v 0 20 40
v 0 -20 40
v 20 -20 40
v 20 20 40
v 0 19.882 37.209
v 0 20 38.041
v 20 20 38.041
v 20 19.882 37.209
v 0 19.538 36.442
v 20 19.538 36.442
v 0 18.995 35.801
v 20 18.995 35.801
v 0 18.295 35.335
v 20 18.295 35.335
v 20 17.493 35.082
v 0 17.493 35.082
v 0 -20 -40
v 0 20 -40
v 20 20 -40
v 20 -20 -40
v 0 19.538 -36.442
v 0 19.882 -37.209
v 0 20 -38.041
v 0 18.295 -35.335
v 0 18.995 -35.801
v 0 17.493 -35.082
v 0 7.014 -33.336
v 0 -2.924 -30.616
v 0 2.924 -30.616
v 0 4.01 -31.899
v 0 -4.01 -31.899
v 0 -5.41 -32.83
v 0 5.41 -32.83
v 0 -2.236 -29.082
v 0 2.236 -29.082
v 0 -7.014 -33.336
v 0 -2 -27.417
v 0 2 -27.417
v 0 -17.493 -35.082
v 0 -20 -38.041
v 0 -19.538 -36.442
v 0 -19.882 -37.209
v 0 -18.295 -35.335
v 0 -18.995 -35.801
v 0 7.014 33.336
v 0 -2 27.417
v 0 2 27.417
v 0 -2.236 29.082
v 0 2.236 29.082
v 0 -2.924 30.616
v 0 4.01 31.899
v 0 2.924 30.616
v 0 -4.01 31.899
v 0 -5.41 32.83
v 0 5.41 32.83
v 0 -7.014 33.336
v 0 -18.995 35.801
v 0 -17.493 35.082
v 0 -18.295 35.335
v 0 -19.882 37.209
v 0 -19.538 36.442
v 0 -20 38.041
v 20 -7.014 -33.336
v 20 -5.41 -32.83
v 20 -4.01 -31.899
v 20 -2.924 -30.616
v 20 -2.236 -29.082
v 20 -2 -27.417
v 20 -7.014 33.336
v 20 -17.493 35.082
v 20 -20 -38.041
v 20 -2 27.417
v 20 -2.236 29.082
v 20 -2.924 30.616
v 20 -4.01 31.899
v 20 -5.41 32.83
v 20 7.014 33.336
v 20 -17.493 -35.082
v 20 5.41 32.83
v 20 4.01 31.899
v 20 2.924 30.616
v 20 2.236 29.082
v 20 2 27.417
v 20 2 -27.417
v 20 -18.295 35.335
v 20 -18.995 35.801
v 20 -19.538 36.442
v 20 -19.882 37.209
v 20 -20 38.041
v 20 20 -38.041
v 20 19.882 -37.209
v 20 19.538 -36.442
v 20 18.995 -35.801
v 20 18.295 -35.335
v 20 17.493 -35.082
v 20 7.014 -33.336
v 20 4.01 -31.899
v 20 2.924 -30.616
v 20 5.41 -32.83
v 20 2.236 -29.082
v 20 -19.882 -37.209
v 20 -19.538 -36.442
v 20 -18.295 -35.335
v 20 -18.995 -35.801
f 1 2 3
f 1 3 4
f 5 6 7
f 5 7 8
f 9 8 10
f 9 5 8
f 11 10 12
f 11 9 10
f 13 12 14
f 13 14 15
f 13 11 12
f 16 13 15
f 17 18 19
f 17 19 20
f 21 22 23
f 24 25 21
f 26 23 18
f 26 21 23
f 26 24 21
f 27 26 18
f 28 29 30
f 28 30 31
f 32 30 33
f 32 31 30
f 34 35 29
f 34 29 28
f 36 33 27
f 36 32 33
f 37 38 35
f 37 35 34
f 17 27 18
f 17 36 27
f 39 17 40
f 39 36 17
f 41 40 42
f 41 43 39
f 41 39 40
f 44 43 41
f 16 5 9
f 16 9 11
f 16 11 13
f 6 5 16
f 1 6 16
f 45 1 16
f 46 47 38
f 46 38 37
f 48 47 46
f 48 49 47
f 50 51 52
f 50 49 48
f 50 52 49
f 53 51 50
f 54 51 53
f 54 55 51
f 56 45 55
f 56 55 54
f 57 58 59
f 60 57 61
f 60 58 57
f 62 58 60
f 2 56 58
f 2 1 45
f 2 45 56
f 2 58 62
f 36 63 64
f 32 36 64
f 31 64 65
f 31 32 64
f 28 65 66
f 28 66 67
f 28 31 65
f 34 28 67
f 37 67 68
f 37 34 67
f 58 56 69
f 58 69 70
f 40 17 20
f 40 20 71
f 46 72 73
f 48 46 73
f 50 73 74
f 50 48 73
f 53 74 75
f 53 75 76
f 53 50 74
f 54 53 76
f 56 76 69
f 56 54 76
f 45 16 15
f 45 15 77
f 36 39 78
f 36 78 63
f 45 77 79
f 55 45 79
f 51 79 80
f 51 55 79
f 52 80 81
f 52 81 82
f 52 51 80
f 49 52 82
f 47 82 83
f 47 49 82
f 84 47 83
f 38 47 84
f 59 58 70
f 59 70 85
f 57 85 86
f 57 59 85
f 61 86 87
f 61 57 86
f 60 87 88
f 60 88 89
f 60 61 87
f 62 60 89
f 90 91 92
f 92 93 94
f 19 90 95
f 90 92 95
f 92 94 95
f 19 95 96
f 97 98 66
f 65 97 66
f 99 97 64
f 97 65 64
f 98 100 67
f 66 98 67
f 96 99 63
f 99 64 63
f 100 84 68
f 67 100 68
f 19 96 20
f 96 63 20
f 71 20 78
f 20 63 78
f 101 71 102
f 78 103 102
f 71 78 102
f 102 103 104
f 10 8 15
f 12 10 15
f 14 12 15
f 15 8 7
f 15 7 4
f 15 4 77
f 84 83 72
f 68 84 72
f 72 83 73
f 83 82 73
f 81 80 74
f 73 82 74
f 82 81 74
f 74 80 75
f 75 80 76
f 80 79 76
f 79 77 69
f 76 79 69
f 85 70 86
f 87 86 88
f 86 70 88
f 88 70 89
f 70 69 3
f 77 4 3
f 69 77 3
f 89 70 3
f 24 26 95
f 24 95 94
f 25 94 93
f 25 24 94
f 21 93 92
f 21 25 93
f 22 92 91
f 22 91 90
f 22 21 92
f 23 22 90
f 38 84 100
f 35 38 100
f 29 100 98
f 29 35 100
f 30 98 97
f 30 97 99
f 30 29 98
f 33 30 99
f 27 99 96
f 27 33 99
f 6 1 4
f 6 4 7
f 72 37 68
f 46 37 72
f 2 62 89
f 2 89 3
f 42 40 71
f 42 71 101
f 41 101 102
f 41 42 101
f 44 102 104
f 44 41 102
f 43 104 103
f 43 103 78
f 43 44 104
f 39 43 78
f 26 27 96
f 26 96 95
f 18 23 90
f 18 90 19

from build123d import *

# Parameters (mm, degrees)
SB_KIRI_80_X_6_1_DEPTH = 20


with BuildPart() as part:
    # Sketch1 → Sb kiriş 80 X 6(1) (new body)
    with BuildSketch(Plane.YZ):
        with BuildLine():
            Line((-20, -40), (-20, -38.04146021))
            ThreePointArc((-20, -38.04146021), (-19.289071417, -36.102349061), (-17.493231968, -35.082284273))
            Line((-17.493231968, -35.082284273), (-7.013536064, -33.335540874))
            ThreePointArc((-7.013536064, -33.335540874), (-3.421857166, -31.295411298), (-2, -27.417189))
            Line((-2, -27.417189), (-2, 27.417189))
            ThreePointArc((-2, 27.417189), (-3.421857166, 31.295411298), (-7.013536064, 33.335540874))
            Line((-7.013536064, 33.335540874), (-17.493231968, 35.082284273))
            ThreePointArc((-17.493231968, 35.082284273), (-19.289071417, 36.102349061), (-20, 38.04146021))
            Line((-20, 38.04146021), (-20, 40))
            Line((-20, 40), (20, 40))
            Line((20, 40), (20, 38.04146021))
            ThreePointArc((20, 38.04146021), (19.289071417, 36.102349061), (17.493231968, 35.082284273))
            Line((17.493231968, 35.082284273), (7.013536064, 33.335540874))
            ThreePointArc((7.013536064, 33.335540874), (3.421857166, 31.295411298), (2, 27.417189))
            Line((2, 27.417189), (2, -27.417189))
            ThreePointArc((2, -27.417189), (3.421857166, -31.295411298), (7.013536064, -33.335540874))
            Line((7.013536064, -33.335540874), (17.493231968, -35.082284273))
            ThreePointArc((17.493231968, -35.082284273), (19.289071417, -36.102349061), (20, -38.04146021))
            Line((20, -38.04146021), (20, -40))
            Line((20, -40), (-20, -40))
        make_face()
    extrude(amount=SB_KIRI_80_X_6_1_DEPTH)


solid = part.part
